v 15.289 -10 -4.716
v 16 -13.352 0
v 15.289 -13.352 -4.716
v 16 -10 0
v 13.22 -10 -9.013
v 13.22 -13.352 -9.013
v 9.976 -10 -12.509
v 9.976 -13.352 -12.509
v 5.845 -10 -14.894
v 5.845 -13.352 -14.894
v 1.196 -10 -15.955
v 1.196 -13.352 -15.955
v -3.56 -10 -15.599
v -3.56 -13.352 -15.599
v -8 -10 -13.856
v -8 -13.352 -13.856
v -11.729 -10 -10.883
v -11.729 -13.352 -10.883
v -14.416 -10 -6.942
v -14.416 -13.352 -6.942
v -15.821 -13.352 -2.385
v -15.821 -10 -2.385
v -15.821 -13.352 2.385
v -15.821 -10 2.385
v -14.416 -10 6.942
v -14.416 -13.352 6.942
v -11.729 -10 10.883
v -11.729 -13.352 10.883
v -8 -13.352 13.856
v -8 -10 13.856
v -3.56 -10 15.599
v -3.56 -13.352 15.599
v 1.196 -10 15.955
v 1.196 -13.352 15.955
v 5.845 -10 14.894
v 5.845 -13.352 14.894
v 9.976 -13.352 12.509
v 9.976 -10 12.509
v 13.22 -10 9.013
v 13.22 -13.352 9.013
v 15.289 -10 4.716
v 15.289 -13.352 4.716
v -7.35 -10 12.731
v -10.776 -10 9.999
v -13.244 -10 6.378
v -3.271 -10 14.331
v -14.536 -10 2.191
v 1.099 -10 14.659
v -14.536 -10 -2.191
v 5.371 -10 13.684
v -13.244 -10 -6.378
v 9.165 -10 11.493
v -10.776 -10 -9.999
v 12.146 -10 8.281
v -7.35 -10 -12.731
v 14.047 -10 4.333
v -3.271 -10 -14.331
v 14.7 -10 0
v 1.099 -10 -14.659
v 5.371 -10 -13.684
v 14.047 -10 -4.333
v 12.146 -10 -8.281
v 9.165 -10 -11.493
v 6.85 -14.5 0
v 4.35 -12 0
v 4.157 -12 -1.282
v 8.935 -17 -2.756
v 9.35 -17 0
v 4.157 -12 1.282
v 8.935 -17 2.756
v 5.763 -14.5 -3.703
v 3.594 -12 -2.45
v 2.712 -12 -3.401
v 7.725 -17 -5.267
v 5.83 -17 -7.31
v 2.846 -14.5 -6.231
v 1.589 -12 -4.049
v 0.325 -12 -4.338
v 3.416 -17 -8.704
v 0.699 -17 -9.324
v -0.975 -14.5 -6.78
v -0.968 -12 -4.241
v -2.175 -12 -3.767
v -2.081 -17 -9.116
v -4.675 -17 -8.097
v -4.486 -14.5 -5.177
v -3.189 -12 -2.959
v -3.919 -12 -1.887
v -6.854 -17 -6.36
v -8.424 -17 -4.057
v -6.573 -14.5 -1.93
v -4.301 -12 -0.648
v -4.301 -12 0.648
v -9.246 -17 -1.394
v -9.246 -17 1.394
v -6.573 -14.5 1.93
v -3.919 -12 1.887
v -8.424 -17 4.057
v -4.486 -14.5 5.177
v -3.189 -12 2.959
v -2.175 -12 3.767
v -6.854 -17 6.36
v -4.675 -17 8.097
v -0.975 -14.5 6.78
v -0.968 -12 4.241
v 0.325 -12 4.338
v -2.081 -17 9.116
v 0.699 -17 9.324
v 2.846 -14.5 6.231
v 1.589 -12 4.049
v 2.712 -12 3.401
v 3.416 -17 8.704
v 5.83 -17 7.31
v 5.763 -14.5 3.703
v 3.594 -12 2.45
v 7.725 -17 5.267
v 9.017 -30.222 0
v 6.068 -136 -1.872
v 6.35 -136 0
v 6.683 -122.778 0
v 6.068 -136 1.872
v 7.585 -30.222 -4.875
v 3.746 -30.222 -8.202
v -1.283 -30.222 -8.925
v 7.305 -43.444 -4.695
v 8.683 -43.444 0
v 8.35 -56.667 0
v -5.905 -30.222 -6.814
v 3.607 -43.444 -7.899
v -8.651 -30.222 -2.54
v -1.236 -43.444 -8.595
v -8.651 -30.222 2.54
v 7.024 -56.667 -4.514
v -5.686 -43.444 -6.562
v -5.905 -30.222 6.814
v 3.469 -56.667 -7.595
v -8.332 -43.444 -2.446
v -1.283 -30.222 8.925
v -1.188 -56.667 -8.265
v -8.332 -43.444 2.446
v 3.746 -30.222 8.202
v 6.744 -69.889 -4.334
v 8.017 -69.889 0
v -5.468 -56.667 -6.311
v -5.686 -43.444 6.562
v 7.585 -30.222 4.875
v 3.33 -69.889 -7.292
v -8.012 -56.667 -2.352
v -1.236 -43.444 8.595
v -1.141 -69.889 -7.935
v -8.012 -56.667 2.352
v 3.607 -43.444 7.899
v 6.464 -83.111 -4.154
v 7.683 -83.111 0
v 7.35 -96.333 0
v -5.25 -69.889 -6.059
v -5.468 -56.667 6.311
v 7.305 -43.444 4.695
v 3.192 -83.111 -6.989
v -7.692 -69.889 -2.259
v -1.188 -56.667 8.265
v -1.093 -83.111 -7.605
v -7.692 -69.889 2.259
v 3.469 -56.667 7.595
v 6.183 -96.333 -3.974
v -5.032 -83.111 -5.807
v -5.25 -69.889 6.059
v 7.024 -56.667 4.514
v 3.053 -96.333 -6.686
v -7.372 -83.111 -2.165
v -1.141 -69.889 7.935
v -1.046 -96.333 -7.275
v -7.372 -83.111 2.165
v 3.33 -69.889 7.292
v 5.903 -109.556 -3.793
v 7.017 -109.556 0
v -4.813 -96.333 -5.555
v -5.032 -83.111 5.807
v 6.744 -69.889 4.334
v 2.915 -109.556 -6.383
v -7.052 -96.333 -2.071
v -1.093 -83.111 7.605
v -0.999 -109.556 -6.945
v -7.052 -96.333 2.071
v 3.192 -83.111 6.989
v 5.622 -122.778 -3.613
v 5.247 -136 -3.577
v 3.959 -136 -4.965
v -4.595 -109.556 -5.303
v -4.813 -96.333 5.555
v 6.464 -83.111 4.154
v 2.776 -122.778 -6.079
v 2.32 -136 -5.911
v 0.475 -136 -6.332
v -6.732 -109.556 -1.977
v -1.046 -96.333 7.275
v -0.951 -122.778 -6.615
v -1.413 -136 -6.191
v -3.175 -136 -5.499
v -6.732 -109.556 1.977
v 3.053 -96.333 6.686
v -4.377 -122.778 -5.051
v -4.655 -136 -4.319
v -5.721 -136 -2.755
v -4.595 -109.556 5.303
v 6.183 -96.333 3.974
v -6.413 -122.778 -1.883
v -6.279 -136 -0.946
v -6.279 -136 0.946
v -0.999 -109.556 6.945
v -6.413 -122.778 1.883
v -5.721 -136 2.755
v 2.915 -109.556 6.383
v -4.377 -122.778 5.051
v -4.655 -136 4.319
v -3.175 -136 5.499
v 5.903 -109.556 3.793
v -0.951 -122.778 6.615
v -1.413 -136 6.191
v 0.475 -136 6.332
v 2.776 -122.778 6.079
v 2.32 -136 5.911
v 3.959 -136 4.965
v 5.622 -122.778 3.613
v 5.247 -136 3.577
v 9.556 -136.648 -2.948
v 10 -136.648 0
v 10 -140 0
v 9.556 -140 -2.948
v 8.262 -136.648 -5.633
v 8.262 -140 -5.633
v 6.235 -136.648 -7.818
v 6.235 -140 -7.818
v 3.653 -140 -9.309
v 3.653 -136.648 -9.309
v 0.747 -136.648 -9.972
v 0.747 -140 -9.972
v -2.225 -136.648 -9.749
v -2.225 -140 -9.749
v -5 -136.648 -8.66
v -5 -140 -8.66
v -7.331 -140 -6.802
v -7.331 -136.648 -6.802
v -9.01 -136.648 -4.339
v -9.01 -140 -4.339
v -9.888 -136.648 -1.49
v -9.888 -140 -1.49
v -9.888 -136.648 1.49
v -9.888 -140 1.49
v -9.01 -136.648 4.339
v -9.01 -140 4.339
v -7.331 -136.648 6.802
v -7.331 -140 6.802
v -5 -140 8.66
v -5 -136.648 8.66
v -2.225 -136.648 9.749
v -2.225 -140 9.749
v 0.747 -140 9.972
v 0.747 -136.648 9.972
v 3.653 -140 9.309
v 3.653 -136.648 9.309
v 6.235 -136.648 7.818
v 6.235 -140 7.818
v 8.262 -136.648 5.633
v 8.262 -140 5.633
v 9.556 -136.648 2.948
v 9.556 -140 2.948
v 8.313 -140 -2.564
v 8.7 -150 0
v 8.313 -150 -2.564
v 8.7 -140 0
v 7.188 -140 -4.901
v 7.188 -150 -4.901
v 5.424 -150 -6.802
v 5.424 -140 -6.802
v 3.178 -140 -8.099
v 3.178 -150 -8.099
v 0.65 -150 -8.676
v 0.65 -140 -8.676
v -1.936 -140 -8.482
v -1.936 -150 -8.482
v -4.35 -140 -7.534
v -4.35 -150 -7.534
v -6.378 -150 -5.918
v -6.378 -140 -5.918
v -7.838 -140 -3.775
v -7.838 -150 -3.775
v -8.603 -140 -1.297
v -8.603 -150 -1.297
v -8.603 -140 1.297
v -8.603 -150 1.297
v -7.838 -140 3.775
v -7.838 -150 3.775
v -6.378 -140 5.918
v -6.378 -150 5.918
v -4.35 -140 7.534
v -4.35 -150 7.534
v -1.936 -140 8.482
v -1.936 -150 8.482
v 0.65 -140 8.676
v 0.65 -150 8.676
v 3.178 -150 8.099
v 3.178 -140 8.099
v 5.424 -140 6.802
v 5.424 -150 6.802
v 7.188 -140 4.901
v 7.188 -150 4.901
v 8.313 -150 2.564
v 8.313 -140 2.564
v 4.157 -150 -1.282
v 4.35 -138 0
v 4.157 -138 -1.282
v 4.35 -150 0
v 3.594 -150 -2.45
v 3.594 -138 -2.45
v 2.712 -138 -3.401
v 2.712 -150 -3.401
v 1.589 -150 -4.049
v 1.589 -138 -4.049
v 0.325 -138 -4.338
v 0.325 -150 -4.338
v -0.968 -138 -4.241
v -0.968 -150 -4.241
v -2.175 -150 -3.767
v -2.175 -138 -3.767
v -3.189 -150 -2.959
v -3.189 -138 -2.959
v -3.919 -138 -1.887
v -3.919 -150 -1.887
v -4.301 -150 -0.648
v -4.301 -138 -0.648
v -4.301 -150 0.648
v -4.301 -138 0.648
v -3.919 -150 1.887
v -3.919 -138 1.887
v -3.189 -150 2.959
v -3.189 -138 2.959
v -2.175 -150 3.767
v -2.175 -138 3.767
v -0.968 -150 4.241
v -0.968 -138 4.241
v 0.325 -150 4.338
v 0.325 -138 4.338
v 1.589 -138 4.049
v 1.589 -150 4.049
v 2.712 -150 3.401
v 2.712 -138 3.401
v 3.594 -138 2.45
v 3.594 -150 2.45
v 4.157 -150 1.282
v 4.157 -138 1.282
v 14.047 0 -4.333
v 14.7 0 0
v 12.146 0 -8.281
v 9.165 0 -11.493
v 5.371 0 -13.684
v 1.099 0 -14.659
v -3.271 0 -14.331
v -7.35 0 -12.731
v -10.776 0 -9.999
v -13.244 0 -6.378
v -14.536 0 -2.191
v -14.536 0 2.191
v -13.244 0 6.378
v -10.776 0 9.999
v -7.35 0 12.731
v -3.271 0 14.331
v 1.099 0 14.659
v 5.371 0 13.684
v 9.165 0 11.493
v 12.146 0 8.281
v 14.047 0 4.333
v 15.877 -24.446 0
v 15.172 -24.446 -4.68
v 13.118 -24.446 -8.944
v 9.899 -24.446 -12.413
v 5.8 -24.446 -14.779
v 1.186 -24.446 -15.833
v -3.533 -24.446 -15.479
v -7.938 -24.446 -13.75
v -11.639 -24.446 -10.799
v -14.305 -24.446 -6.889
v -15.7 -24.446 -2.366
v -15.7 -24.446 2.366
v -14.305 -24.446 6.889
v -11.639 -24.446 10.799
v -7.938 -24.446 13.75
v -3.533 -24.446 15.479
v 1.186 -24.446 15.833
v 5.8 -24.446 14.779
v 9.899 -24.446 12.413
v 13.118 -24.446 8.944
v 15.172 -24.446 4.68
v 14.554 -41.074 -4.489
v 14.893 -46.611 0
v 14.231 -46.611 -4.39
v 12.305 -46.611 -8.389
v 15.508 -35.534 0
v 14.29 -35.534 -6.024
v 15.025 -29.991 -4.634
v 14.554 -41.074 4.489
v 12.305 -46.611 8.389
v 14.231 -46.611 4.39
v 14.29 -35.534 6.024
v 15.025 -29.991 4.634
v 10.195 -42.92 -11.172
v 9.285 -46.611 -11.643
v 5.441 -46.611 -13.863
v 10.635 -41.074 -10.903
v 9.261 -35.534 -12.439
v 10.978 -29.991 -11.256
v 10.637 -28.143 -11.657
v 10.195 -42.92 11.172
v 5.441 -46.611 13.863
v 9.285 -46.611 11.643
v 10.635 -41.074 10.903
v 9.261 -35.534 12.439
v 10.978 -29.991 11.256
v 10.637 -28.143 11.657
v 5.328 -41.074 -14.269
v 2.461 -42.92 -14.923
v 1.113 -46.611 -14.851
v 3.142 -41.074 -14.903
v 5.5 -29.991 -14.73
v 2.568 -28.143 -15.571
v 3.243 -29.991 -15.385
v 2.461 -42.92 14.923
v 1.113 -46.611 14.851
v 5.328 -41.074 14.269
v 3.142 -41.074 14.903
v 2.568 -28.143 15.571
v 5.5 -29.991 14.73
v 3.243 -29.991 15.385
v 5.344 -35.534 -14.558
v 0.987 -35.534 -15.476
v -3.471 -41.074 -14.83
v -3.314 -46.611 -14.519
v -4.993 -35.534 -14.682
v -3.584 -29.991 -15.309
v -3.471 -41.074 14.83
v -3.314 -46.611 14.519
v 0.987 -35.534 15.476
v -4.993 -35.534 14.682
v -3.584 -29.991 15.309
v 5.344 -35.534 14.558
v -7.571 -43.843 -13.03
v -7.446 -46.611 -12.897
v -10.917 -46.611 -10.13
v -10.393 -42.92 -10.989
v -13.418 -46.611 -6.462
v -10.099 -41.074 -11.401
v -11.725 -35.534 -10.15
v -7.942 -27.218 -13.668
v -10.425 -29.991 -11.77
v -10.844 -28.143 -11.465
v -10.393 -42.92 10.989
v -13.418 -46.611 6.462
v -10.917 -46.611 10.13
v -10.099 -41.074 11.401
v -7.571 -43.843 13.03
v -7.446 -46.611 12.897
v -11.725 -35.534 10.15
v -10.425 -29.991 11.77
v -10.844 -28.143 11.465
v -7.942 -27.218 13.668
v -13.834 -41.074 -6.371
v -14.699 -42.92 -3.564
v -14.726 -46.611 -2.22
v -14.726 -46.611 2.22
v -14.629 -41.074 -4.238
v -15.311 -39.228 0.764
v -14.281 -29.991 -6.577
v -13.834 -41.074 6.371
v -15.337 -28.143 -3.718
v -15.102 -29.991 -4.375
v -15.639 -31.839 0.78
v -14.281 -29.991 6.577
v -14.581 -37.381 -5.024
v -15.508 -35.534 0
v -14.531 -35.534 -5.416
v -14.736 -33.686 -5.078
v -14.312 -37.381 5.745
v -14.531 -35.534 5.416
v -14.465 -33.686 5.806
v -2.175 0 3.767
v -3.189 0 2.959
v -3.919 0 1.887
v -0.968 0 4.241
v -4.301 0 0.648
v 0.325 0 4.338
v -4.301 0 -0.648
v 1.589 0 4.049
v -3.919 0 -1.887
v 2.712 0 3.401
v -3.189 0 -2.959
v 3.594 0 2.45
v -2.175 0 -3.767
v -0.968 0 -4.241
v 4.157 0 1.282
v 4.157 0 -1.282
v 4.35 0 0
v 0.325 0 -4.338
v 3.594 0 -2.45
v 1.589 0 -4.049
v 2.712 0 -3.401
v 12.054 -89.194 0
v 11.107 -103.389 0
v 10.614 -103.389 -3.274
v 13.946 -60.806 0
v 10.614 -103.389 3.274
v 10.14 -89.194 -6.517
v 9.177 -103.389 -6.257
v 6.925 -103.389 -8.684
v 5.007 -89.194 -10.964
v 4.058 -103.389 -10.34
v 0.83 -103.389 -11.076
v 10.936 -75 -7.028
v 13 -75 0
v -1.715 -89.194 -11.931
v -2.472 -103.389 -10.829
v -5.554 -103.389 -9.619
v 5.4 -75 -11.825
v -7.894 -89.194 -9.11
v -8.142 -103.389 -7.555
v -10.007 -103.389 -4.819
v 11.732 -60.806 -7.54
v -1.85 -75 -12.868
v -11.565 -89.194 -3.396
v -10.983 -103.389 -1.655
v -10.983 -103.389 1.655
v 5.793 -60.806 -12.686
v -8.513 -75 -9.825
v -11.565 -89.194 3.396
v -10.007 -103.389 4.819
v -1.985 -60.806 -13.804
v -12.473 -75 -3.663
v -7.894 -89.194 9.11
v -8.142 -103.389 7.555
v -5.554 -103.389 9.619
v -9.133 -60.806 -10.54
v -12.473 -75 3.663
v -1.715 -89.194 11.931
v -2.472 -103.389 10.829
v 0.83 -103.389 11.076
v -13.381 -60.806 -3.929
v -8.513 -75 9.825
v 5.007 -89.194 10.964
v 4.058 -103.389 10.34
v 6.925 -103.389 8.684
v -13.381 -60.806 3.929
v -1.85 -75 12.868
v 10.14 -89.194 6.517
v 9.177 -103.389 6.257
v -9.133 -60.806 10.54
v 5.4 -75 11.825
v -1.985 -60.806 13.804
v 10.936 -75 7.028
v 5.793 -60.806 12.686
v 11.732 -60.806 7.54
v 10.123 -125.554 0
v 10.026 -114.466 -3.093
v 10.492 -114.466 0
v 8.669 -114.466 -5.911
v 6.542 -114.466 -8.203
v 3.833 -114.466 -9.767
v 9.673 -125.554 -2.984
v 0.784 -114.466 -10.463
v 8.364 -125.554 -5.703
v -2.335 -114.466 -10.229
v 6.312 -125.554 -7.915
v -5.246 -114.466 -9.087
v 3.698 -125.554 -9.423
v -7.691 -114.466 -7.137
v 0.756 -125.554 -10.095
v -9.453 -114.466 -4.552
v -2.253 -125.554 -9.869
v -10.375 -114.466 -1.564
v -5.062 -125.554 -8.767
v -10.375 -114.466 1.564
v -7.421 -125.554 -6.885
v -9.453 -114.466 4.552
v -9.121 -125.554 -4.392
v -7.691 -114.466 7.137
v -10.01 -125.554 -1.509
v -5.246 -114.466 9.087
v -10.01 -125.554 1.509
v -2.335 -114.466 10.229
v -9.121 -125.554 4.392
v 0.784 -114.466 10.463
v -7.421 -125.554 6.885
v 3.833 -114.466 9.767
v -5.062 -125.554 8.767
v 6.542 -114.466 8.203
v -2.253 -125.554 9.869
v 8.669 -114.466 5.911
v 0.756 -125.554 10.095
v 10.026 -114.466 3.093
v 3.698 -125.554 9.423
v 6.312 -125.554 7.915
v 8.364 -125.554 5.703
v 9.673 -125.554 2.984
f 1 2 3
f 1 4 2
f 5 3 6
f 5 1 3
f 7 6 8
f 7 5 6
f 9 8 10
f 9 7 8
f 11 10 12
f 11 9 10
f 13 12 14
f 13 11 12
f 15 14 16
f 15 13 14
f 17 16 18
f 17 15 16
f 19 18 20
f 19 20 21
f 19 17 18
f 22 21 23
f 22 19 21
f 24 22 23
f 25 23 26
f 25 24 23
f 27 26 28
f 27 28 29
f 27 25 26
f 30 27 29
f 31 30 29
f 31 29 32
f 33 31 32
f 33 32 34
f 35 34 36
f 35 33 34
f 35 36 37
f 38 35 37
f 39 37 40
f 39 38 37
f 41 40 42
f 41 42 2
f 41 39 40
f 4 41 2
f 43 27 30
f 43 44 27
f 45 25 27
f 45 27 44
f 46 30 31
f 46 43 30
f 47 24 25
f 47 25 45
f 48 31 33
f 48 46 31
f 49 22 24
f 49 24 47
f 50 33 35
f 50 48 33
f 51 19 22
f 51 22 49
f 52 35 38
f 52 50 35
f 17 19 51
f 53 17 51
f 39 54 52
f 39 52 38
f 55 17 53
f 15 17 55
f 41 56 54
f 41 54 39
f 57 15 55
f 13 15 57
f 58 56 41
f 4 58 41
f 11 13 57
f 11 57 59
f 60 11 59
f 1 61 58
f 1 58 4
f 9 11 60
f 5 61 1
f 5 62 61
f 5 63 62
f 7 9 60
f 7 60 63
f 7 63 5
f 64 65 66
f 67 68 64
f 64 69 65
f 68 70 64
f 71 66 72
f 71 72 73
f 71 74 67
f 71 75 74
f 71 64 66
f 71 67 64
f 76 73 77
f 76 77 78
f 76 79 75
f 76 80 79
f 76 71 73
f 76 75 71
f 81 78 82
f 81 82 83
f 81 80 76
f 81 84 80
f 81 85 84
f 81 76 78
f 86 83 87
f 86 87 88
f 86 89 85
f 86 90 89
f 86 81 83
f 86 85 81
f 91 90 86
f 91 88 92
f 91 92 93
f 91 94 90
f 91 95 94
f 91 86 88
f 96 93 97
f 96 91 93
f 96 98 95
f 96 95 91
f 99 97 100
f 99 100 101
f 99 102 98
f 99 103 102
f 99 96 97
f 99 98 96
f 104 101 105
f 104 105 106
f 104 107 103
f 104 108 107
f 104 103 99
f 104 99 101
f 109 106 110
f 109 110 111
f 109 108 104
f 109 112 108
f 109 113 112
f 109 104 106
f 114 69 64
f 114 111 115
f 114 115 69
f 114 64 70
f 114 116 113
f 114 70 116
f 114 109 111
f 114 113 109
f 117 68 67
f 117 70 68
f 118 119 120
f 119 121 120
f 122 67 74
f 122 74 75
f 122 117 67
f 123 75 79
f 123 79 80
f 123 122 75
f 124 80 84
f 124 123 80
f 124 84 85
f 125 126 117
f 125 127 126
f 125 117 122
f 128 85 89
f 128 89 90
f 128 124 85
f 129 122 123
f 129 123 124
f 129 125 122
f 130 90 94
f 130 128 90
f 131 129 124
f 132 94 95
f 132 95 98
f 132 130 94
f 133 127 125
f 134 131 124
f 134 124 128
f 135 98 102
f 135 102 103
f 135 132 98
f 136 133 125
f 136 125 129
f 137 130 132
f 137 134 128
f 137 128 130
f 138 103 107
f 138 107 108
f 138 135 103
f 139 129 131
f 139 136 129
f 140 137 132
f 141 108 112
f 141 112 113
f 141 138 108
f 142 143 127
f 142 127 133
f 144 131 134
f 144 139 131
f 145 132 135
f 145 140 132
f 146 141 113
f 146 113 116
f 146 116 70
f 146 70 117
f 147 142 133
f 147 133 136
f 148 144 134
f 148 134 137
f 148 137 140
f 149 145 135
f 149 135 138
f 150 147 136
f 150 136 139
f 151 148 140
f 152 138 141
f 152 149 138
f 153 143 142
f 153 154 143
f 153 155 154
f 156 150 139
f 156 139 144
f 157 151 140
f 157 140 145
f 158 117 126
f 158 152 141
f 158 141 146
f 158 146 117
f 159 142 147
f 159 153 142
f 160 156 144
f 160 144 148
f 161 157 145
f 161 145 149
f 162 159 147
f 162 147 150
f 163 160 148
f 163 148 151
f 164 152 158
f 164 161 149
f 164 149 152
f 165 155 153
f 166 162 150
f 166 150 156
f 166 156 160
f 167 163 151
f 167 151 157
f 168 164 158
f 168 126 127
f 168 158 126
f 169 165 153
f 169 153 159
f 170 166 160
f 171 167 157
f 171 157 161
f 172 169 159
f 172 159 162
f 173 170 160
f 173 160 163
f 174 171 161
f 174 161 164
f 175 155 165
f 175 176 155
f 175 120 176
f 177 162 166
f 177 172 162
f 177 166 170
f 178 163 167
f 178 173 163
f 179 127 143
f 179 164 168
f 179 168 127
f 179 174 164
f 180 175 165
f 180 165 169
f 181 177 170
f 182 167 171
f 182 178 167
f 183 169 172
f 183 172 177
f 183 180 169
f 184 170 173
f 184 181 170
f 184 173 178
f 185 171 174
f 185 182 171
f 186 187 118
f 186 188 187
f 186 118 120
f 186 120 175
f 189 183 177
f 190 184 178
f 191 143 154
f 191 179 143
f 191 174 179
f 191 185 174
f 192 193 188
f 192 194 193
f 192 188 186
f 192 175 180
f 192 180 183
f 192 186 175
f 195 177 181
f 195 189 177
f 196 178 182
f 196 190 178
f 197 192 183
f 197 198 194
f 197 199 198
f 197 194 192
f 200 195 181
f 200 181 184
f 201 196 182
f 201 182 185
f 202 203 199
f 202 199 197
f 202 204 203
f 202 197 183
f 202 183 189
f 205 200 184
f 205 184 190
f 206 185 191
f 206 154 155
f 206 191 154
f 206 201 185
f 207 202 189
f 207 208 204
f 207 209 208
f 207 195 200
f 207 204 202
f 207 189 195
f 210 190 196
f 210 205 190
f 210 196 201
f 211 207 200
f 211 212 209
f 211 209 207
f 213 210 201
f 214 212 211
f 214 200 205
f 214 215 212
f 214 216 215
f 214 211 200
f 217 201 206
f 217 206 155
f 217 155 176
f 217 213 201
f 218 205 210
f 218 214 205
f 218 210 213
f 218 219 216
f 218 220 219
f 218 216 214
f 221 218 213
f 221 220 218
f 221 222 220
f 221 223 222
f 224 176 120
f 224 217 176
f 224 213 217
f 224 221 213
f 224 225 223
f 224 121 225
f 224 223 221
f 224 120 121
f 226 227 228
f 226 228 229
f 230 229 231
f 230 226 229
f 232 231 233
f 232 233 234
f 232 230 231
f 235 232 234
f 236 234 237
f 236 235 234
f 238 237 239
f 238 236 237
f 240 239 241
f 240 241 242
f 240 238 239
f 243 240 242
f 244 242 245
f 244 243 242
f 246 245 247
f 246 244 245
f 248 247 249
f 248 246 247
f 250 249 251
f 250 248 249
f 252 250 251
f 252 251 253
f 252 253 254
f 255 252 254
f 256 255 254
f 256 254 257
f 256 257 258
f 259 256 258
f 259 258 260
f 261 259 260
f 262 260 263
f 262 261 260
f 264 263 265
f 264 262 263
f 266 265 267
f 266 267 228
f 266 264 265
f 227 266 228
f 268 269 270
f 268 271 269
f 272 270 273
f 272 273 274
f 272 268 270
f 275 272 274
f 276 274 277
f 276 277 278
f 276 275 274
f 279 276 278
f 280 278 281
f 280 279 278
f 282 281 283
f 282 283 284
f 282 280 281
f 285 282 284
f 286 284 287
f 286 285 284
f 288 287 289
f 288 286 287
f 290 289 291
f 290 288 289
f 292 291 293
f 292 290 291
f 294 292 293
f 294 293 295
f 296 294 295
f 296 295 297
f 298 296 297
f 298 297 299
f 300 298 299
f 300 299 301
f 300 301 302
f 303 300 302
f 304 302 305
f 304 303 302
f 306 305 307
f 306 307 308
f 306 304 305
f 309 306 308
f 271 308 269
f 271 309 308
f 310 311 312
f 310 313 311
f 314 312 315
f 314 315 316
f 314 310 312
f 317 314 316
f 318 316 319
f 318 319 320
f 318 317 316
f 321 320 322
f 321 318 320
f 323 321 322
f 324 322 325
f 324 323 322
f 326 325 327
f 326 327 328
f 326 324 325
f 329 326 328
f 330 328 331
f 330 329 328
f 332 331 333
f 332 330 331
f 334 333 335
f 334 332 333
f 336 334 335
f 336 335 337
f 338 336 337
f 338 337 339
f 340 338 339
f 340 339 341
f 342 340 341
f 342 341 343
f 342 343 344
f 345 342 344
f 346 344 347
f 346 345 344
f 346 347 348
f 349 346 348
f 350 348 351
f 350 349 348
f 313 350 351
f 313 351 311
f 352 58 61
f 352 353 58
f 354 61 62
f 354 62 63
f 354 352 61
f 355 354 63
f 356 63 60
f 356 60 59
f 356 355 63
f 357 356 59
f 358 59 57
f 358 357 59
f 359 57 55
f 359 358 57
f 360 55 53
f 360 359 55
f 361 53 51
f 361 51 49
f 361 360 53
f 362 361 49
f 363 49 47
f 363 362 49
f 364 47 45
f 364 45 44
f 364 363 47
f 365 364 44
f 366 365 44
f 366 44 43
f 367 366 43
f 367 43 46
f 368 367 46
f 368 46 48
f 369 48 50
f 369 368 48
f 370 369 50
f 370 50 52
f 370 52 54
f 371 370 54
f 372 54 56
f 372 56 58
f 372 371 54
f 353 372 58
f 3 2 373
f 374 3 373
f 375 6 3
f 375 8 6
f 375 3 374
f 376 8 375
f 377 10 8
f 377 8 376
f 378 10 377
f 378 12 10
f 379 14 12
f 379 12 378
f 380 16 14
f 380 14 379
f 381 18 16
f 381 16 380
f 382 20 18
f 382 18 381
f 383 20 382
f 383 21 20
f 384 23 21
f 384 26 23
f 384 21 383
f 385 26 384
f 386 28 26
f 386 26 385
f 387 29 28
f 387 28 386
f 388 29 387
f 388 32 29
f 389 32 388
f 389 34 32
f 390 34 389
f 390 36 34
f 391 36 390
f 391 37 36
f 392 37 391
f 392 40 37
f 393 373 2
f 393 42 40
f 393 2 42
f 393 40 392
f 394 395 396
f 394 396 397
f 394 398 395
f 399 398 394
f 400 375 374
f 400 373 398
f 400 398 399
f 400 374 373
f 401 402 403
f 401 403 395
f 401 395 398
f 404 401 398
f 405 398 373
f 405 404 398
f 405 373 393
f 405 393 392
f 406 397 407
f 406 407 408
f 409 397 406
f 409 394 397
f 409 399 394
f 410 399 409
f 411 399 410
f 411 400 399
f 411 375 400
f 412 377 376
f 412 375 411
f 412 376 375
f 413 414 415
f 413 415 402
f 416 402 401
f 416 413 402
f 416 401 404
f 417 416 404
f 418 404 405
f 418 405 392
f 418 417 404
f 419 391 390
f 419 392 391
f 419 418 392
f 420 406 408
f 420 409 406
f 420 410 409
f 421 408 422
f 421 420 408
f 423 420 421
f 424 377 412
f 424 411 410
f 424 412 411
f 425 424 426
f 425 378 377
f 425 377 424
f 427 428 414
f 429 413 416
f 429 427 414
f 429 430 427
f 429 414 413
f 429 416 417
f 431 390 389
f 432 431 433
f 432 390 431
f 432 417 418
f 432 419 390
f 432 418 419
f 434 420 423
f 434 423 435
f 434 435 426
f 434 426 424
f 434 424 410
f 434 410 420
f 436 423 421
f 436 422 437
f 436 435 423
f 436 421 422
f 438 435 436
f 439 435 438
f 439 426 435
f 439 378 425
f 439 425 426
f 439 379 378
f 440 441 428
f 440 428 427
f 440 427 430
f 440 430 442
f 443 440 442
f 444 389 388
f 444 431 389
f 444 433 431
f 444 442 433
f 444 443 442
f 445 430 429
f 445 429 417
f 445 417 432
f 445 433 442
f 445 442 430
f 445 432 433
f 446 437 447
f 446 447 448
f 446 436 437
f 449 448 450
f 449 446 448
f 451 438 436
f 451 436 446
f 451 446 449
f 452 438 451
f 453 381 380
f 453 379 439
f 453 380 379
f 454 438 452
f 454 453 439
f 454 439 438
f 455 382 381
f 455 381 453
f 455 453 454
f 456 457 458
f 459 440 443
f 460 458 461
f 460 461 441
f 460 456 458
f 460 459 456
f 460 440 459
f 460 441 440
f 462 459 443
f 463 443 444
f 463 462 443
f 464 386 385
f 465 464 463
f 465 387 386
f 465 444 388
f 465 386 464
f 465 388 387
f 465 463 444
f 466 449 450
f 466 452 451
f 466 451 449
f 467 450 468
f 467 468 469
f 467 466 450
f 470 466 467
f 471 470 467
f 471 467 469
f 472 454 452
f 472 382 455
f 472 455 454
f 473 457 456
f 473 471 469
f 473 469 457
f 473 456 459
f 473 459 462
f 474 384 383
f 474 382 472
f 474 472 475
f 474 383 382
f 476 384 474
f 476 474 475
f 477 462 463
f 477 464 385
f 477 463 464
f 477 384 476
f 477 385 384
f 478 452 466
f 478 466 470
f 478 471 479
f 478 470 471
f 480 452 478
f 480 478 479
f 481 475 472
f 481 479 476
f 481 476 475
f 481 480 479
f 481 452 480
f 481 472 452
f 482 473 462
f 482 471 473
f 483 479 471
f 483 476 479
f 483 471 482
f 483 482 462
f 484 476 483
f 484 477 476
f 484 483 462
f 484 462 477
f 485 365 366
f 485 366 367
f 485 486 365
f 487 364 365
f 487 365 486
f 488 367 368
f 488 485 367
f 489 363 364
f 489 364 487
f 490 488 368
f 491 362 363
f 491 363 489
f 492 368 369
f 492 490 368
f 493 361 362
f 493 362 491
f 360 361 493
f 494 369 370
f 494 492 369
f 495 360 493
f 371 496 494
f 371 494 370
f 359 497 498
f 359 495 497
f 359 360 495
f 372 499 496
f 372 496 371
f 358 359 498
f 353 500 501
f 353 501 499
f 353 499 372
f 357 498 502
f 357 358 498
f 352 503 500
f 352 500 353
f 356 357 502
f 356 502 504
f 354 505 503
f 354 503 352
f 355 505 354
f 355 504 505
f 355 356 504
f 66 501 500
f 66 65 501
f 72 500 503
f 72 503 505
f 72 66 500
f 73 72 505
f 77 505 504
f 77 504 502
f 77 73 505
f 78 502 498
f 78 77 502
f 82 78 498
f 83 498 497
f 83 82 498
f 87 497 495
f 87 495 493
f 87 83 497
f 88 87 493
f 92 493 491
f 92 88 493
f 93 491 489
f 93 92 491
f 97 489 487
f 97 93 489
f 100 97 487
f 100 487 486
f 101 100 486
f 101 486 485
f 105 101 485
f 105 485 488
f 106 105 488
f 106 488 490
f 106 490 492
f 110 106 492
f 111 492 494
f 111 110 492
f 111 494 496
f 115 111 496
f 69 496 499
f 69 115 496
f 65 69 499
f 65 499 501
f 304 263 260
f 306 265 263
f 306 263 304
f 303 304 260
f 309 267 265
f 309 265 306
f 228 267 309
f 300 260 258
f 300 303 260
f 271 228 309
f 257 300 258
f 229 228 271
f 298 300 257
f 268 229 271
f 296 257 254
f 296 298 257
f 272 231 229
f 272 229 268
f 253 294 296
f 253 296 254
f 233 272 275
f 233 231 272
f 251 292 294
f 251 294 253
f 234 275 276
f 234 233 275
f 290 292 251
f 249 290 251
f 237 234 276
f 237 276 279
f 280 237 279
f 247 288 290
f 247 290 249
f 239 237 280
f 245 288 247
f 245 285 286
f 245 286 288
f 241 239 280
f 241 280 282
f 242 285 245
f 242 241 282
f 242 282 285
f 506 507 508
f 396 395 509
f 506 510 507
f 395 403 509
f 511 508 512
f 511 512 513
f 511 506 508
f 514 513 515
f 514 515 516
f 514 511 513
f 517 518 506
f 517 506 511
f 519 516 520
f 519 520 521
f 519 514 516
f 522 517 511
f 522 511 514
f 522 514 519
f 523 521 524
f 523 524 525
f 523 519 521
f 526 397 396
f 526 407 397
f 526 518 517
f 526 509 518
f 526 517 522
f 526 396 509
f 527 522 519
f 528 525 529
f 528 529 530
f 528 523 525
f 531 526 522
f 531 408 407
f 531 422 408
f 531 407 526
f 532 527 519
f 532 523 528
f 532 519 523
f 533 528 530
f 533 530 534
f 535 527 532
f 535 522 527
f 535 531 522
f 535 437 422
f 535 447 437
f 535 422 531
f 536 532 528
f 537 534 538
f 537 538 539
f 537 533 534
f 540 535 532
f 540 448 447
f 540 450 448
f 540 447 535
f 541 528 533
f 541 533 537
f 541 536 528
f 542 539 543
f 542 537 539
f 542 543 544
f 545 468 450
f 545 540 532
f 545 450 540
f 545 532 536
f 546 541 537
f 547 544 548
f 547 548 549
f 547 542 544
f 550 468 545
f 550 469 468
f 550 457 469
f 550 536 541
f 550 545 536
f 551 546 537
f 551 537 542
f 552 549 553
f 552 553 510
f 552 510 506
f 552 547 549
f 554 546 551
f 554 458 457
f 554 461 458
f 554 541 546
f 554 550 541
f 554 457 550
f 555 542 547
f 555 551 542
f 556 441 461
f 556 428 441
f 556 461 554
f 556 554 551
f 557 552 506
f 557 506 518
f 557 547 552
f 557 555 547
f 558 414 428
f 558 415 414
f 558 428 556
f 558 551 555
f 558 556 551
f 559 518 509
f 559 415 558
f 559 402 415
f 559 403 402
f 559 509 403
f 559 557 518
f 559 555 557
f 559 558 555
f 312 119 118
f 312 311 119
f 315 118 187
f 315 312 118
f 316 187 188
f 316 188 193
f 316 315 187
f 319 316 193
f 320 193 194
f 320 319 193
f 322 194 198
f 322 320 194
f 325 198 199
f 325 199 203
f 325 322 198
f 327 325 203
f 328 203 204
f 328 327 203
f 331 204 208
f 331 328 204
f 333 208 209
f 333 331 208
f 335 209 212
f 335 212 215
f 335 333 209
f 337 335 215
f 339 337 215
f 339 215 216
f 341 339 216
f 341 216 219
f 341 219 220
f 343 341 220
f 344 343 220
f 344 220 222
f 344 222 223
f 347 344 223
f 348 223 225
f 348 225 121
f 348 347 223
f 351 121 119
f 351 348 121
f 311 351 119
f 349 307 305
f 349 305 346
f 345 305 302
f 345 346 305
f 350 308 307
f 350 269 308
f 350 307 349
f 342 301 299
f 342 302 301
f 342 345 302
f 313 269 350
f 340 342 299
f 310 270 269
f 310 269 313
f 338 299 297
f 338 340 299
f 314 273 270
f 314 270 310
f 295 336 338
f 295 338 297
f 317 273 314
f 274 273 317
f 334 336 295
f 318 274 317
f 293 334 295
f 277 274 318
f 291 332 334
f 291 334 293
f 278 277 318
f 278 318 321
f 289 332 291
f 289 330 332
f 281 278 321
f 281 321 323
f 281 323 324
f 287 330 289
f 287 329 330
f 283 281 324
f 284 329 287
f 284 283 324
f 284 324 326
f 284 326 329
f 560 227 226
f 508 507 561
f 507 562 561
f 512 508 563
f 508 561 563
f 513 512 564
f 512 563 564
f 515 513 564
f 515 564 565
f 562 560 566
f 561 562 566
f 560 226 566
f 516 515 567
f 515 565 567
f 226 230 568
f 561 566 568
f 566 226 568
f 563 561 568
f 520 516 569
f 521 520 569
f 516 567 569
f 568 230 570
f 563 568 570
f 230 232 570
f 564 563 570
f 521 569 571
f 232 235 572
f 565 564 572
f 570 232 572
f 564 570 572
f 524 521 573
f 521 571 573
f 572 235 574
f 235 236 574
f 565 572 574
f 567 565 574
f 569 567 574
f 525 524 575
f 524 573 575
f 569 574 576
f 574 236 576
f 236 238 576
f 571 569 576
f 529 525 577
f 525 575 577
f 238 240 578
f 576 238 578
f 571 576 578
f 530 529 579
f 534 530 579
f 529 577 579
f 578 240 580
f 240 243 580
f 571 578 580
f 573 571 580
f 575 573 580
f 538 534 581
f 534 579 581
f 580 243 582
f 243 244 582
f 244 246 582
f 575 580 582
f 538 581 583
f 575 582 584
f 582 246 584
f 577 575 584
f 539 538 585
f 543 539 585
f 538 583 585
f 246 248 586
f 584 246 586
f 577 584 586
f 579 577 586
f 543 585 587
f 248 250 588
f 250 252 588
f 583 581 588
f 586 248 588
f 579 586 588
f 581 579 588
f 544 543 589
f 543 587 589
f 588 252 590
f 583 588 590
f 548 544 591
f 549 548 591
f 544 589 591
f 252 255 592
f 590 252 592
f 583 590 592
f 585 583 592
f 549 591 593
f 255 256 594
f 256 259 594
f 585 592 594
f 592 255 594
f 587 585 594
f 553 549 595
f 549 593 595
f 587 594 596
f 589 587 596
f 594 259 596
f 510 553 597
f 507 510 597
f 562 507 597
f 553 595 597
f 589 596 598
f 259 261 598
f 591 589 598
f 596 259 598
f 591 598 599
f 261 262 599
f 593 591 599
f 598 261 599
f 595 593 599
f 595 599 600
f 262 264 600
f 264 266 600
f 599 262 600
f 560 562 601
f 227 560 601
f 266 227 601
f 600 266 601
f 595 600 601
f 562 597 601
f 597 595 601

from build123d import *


# Not quite as in the source:
# - a fillet or chamfer that OpenCascade refuses, or shapes differently, is made with other operations: its cross-section is extruded or revolved along the edge and cut away or added


with BuildPart() as f1:
    # F0 (on Top) → F1 (revolve)
    with BuildSketch(Plane.XY):
        Polygon((14.7, 0), (4.35, 0), (4.35, -12), (9.35, -17), (6.35, -136), (4.35, -138), (4.35, -150), (8.7, -150), (8.7, -140), (10, -140), (10, -120), (16, -30), (16, -10), (14.7, -10), align=None)
    revolve(axis=Axis((0, -75, 0), (0, 1, 0)))

    # F2: fillet of radius 500 on 2 edges, made by hand

    # F2_s1 → F2_t2 (revolve, cut)
    with BuildSketch(Plane.XY):
        with BuildLine():
            ThreePointArc((14.8925789283, -46.6113160754), (15.7230680408, -29.9907791687), (16, -13.3518108135))
            Line((16, -13.3518108135), (16, -30))
            Line((16, -30), (14.8925789283, -46.6113160754))
        make_face()
    revolve(axis=Axis((0, -30, 0), (0, 1, 0)), mode=Mode.SUBTRACT)

    # F2_s3 → F2_t4 (revolve)
    with BuildSketch(Plane.XY):
        with BuildLine():
            ThreePointArc((11.1074210717, -103.3886839246), (10.2769319592, -120.0092208313), (10, -136.6481891865))
            Line((10, -136.6481891865), (10, -120))
            Line((10, -120), (11.1074210717, -103.3886839246))
        make_face()
    revolve(axis=Axis((0, -120, 0), (0, 1, 0)))


solid = f1.part
